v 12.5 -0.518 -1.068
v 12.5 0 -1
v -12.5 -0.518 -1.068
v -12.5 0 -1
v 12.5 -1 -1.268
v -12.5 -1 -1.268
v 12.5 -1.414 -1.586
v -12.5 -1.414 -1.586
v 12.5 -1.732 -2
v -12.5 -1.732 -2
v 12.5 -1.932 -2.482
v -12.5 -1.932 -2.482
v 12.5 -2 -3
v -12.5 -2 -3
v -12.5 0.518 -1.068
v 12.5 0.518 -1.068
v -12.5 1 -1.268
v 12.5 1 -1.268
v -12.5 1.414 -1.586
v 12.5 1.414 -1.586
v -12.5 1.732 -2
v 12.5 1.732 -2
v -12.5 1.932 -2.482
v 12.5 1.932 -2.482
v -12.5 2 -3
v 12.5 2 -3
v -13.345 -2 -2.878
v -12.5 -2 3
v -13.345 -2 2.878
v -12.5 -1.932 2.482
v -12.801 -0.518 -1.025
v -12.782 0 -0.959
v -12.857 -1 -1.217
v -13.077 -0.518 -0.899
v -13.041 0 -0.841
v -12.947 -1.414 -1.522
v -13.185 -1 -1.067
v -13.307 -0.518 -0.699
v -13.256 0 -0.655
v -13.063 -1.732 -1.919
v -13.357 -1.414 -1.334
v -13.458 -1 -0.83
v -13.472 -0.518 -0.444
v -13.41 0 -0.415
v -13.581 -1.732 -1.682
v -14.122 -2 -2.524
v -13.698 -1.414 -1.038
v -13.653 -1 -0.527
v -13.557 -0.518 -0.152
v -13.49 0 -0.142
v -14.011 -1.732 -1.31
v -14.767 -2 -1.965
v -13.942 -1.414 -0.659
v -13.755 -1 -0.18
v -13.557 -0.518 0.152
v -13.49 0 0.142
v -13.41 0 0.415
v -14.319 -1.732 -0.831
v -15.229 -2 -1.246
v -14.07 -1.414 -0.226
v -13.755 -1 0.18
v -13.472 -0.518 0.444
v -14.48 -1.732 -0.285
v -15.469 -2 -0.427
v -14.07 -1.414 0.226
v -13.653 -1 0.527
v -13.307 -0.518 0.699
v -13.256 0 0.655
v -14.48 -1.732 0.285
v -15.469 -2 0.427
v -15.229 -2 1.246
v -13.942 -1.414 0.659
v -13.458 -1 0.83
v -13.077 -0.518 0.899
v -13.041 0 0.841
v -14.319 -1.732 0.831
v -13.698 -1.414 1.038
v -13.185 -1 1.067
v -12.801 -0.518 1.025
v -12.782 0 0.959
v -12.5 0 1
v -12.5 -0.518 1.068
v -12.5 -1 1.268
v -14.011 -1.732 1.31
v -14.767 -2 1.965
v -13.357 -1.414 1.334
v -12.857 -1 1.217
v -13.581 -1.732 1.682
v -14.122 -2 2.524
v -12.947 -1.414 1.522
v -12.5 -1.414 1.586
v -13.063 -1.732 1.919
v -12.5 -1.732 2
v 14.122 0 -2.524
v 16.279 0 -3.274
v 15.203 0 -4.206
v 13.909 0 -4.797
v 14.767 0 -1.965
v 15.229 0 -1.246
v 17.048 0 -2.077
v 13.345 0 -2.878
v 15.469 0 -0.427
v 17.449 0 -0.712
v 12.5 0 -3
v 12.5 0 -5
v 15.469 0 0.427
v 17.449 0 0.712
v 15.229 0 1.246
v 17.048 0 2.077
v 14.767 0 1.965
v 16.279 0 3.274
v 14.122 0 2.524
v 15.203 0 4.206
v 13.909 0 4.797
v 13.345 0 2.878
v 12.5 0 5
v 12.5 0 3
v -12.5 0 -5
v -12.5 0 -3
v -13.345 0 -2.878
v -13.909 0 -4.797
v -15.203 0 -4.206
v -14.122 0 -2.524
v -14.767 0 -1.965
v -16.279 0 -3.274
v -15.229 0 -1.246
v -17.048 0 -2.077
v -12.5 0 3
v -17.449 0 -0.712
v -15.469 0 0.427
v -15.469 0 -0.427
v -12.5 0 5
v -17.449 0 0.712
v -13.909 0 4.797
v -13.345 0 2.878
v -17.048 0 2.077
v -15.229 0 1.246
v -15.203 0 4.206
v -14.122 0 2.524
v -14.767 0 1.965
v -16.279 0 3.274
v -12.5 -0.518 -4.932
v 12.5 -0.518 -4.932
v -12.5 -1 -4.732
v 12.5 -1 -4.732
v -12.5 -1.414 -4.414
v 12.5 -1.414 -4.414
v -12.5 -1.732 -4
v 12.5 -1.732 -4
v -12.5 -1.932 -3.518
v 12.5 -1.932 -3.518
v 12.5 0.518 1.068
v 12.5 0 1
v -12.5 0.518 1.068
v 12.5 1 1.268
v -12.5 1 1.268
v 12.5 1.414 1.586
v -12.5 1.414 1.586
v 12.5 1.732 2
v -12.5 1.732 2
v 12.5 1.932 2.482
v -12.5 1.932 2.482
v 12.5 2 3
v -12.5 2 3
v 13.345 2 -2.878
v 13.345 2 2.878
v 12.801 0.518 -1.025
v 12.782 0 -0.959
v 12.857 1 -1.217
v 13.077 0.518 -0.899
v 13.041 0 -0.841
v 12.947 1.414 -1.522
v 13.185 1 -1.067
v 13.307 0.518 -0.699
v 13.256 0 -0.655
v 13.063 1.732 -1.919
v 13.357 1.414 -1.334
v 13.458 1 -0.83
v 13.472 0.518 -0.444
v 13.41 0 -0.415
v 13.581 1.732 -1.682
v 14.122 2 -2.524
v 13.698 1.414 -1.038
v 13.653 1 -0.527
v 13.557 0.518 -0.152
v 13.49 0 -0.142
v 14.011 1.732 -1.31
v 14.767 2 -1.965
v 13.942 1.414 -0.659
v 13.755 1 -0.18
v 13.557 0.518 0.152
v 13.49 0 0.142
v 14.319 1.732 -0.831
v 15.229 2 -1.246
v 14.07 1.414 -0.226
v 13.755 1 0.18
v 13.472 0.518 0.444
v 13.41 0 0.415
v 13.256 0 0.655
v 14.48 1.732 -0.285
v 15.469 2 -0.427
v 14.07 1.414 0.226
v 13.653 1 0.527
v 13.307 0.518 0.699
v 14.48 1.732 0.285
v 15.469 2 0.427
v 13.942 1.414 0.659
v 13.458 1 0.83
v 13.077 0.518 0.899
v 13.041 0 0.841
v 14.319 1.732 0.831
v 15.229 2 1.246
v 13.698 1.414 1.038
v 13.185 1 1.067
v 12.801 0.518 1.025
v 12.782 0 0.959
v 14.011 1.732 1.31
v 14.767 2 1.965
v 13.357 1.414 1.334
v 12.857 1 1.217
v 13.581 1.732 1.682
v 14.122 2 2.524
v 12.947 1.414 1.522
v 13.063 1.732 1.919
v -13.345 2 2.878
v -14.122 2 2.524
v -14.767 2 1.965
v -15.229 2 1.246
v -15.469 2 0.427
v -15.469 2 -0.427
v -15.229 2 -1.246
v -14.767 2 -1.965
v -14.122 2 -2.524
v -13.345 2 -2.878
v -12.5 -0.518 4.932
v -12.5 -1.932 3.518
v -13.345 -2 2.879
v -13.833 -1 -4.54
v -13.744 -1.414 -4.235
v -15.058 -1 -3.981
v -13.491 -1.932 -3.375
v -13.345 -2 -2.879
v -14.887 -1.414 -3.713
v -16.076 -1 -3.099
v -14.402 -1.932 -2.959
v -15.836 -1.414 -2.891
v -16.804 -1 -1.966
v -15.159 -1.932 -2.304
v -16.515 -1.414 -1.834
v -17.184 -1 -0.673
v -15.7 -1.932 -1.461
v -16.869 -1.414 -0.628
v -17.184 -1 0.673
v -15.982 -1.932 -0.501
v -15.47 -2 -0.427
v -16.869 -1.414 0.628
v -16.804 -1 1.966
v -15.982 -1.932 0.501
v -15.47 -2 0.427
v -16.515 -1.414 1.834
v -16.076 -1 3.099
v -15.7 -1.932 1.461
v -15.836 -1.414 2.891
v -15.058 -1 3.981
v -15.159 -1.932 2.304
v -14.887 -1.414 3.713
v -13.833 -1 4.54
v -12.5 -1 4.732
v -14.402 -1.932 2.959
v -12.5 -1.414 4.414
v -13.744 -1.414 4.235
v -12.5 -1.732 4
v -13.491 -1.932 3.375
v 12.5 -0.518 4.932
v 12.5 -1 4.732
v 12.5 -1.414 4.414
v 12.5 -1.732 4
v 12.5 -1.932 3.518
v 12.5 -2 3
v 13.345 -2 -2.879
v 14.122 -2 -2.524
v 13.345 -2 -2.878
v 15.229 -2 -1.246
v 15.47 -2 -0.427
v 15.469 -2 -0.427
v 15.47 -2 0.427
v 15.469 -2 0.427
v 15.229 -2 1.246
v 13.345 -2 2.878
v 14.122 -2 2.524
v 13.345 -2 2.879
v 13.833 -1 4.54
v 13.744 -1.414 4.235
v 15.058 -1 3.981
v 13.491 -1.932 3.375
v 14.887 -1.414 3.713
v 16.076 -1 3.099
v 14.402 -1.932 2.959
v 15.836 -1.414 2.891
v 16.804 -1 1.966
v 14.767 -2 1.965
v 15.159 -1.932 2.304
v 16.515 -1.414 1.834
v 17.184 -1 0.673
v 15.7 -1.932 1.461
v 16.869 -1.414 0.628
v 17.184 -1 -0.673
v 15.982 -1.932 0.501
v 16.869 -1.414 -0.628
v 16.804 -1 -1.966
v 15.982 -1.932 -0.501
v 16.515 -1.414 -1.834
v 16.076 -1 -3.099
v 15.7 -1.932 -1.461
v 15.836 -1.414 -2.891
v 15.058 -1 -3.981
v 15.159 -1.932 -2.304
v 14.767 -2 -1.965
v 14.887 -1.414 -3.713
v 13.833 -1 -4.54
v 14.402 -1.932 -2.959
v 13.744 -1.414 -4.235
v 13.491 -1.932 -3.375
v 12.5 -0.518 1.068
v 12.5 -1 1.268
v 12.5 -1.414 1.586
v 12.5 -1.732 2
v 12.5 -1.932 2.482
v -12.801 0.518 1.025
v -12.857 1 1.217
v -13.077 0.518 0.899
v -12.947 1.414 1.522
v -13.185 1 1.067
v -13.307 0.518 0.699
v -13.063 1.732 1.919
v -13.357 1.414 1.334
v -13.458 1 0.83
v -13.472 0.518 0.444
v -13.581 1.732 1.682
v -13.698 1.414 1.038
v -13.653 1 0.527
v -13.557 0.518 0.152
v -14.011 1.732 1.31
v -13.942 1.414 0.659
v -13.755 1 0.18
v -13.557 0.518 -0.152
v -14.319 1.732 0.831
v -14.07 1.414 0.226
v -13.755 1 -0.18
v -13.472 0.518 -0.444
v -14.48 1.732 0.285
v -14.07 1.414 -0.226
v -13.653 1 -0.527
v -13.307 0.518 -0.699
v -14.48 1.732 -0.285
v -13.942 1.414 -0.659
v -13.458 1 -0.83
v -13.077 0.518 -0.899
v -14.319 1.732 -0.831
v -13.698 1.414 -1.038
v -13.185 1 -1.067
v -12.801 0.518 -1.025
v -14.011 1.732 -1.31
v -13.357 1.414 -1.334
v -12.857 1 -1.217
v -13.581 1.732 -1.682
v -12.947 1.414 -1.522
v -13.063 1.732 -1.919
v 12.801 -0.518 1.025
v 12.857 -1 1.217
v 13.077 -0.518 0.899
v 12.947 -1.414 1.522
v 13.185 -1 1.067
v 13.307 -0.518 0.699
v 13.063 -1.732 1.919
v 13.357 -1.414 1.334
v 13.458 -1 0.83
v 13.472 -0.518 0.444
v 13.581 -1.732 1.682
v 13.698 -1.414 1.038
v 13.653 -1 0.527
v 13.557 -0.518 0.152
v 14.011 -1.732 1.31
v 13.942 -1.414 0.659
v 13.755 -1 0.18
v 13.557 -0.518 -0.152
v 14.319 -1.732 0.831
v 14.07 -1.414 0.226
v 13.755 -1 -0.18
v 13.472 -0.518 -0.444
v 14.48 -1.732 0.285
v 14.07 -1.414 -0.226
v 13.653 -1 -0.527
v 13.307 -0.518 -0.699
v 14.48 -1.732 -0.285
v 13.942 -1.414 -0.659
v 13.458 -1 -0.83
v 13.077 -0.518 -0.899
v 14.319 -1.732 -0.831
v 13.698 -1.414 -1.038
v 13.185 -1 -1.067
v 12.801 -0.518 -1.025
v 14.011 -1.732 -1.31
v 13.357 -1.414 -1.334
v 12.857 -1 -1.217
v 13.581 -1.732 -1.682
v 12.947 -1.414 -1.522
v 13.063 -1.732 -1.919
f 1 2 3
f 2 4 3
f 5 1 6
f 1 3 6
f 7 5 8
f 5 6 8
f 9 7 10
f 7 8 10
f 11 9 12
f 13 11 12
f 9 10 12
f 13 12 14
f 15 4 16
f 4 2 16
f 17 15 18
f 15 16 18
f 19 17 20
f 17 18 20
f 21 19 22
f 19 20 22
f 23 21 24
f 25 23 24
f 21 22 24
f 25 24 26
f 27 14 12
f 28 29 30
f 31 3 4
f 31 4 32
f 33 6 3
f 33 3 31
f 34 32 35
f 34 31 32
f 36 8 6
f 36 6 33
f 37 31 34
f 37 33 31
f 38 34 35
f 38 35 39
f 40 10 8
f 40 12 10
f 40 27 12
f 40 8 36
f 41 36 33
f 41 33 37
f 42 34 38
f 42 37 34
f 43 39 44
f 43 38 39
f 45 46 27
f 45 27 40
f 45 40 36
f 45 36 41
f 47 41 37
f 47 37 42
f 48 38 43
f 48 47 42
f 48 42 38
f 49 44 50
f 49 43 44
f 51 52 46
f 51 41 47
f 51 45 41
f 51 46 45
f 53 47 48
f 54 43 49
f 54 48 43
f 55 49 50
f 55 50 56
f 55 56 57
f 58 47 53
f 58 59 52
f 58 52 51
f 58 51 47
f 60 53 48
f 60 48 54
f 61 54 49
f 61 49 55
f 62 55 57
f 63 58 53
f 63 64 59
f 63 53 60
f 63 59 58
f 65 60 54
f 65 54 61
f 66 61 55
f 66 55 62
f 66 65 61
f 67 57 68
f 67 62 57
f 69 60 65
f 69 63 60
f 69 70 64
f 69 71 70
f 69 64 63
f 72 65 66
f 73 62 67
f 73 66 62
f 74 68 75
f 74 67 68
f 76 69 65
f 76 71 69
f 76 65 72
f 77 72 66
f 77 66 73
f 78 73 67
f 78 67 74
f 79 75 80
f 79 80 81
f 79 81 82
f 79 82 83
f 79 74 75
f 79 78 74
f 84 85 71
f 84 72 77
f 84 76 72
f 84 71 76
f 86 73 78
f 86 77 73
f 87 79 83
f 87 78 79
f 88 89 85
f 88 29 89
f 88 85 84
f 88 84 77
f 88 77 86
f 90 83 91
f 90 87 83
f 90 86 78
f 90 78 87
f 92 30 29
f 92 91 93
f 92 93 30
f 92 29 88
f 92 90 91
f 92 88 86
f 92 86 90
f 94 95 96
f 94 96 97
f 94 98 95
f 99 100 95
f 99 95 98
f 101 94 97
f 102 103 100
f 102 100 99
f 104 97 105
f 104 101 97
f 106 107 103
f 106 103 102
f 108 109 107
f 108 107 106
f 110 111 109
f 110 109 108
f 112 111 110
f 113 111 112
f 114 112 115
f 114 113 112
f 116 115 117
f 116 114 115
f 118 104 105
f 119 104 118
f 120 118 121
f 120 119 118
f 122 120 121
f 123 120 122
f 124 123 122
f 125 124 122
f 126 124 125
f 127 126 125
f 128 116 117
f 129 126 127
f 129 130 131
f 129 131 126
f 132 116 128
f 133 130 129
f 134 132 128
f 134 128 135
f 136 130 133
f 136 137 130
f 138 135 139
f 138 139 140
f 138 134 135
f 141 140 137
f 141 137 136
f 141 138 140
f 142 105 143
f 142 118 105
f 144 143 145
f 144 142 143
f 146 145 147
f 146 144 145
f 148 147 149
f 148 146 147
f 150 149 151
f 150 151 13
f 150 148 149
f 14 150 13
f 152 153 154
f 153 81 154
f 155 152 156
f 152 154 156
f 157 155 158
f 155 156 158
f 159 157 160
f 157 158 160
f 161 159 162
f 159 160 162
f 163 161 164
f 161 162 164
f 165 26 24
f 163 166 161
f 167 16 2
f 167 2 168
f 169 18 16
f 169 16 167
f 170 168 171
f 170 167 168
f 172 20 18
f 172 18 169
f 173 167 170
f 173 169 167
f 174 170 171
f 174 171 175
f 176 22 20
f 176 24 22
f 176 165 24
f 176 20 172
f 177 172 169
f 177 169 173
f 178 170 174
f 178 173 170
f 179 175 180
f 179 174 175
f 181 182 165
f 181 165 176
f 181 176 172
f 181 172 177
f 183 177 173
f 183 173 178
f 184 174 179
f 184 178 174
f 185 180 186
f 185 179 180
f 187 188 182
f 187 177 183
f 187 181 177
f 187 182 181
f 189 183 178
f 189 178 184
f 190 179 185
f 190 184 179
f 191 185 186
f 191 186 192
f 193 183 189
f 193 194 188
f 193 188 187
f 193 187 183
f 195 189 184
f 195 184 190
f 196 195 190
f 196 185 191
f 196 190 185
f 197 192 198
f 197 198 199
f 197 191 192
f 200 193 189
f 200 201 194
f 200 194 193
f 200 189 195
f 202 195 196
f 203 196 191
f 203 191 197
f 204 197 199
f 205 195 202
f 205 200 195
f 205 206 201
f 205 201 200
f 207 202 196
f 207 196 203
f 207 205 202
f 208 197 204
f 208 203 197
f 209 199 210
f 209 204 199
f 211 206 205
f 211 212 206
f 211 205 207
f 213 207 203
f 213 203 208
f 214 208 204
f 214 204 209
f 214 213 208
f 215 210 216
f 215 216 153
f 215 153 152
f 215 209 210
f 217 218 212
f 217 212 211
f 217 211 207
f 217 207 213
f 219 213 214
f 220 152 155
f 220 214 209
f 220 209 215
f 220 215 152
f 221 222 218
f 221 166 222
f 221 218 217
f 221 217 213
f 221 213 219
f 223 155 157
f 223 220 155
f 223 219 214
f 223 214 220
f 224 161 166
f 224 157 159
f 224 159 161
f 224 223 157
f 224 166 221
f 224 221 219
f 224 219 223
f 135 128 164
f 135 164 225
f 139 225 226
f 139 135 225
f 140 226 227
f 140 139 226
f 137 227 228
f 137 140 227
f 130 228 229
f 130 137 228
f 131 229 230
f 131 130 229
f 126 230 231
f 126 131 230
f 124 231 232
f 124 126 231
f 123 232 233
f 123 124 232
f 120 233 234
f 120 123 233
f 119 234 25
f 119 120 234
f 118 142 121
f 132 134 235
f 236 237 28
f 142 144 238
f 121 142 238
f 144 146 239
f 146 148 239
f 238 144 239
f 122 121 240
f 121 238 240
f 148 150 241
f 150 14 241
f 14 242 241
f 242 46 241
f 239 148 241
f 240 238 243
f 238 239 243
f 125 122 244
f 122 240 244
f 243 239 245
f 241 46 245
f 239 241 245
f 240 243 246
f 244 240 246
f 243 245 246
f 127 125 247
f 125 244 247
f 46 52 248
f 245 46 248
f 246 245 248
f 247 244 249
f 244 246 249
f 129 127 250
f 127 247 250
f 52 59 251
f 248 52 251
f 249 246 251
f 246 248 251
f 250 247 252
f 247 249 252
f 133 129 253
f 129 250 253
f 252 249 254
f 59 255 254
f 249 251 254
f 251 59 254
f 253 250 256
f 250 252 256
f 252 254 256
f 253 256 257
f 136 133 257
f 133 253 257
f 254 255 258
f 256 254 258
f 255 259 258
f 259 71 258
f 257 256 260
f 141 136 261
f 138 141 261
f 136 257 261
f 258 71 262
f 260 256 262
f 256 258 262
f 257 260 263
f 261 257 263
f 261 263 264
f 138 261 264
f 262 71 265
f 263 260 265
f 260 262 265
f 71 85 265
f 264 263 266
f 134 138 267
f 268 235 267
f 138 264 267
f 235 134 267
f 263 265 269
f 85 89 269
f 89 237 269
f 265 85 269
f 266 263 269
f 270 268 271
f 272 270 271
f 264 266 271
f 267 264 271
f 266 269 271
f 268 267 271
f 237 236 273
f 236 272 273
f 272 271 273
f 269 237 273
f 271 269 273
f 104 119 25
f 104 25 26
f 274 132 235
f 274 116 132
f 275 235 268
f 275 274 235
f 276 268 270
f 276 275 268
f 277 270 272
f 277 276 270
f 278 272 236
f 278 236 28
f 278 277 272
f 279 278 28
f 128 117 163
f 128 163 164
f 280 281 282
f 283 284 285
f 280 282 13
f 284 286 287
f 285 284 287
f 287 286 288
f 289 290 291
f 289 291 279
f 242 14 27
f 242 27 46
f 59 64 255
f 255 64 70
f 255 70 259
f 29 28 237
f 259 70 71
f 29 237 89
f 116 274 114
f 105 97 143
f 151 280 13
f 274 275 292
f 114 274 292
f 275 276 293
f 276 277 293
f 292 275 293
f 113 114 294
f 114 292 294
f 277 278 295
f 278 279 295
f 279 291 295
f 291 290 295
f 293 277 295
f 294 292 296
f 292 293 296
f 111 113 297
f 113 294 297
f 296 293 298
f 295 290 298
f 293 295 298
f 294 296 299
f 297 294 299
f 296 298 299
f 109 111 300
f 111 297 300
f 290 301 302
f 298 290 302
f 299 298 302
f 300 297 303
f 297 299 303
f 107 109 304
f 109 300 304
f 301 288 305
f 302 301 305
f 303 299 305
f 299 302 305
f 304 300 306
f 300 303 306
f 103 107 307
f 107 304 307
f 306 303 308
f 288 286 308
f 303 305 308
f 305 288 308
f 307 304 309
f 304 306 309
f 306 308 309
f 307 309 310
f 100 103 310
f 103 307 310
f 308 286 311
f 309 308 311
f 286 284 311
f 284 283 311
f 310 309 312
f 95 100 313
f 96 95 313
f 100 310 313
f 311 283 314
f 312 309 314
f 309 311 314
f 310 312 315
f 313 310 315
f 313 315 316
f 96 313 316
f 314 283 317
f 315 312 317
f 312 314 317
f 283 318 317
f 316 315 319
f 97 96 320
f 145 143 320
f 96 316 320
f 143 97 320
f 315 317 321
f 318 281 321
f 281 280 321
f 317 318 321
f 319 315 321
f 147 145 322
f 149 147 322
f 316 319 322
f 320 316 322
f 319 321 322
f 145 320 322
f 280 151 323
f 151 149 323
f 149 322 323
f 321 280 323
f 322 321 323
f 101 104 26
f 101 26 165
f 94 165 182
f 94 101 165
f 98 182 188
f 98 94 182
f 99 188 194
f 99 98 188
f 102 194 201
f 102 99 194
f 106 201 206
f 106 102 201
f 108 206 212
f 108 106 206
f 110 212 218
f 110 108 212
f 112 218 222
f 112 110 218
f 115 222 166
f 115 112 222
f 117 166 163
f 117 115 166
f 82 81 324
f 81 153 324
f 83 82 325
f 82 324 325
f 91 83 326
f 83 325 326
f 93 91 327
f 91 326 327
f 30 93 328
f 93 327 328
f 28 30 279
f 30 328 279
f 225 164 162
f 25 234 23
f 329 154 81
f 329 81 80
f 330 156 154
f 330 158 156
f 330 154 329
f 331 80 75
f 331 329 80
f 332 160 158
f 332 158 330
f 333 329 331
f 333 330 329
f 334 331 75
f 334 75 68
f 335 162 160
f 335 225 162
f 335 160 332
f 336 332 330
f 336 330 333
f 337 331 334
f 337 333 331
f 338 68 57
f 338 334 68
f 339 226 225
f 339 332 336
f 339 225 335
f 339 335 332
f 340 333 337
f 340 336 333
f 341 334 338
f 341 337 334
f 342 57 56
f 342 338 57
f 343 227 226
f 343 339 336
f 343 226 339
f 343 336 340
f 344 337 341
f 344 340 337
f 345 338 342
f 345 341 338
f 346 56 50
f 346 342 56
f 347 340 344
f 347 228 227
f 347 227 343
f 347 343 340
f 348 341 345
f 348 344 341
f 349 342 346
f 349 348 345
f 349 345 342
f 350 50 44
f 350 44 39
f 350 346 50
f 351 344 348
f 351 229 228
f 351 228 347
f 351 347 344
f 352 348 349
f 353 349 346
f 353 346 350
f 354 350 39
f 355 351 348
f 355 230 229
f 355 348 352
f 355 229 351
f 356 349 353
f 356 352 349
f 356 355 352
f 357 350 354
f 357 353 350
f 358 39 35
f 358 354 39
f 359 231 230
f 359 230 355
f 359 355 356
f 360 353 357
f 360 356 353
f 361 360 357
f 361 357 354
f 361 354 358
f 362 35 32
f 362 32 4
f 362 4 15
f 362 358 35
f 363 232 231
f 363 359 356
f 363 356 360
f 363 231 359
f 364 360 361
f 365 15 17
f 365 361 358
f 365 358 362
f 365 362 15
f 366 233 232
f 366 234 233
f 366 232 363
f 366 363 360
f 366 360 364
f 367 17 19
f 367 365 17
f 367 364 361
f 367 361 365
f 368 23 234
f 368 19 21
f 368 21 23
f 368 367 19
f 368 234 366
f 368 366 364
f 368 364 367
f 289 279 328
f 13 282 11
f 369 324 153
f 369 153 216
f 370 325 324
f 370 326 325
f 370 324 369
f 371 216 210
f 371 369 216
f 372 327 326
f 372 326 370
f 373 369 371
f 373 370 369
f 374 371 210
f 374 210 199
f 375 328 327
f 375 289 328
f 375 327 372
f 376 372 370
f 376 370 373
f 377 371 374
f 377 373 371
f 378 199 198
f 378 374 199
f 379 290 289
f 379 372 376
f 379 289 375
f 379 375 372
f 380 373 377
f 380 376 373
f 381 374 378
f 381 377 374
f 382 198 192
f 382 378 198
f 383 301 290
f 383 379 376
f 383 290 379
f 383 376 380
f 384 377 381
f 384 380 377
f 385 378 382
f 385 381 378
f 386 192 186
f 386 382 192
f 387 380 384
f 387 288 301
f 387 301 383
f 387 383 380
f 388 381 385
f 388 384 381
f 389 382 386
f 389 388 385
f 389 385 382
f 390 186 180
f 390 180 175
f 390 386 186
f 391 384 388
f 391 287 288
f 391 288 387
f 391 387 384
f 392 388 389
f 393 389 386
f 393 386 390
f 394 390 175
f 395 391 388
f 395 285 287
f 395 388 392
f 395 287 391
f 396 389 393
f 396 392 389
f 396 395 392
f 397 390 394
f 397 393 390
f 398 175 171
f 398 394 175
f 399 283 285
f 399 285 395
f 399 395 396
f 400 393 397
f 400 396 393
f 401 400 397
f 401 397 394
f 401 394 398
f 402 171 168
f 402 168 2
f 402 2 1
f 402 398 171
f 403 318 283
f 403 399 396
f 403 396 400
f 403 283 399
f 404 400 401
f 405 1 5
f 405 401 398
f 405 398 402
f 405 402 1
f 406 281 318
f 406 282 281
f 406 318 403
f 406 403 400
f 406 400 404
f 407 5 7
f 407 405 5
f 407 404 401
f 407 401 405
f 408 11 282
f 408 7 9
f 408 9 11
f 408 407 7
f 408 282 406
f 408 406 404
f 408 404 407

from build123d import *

# Parameters (mm, degrees)
EXTRUDE_THIN1_DEPTH = 2
FILLET1_R           = 2
BOSS_EXTRUDE1_START = 2
BOSS_EXTRUDE1_DEPTH = 2
FILLET2_R           = 2


with BuildPart() as part:
    # Sketch1 → Extrude-Thin1 (new body)
    with BuildSketch(Plane(origin=(0, 0, 0), x_dir=(1, 0, 0), z_dir=(0, 1, 0))):
        with BuildLine():
            Line((12.5, -3), (-12.5, -3))
            ThreePointArc((-12.5, -3), (-15.5, 0), (-12.5, 3))
            Line((-12.5, 3), (12.5, 3))
            ThreePointArc((12.5, 3), (15.5, 0), (12.5, -3))
        make_face()
        with BuildLine():
            Line((12.5, -1), (-12.5, -1))
            ThreePointArc((-12.5, -1), (-13.5, 0), (-12.5, 1))
            Line((-12.5, 1), (12.5, 1))
            ThreePointArc((12.5, 1), (13.5, 0), (12.5, -1))
        make_face(mode=Mode.SUBTRACT)
    extrude(amount=EXTRUDE_THIN1_DEPTH)

    # Fillet1
    fillet1_edges = [part.edges().sort_by_distance(p)[0] for p in [
        (13.5, 2, 0),
        (0, 2, 1),
        (-13.5, 2, 0),
        (0, 2, -1),
    ]]
    fillet(fillet1_edges, radius=FILLET1_R - 0.0001)  # a hair under: the kernel refuses the full size

    # Sketch2 → Boss-Extrude1 (add)
    with BuildSketch(Plane.XZ.offset(BOSS_EXTRUDE1_START)):
        with BuildLine():
            Line((12.5, -5), (-12.5, -5))
            ThreePointArc((-12.5, -5), (-17.5, 0), (-12.5, 5))
            Line((-12.5, 5), (12.5, 5))
            ThreePointArc((12.5, 5), (17.5, 0), (12.5, -5))
        make_face()
        with BuildLine():
            Line((12.5, -1), (-12.5, -1))
            ThreePointArc((-12.5, -1), (-13.5, 0), (-12.5, 1))
            Line((-12.5, 1), (12.5, 1))
            ThreePointArc((12.5, 1), (13.5, 0), (12.5, -1))
        make_face(mode=Mode.SUBTRACT)
    extrude(amount=-BOSS_EXTRUDE1_DEPTH)

    # Fillet2
    fillet2_edges = [part.edges().sort_by_distance(p)[0] for p in [
        (-13.5, -2, 0),
        (0, -2, -1),
        (13.5, -2, 0),
        (0, -2, 1),
        (0, -2, -5),
        (-17.5, -2, 0),
        (0, -2, 5),
        (17.5, -2, 0),
    ]]
    fillet(fillet2_edges, radius=FILLET2_R - 0.0001)  # a hair under: the kernel refuses the full size


solid = part.part
